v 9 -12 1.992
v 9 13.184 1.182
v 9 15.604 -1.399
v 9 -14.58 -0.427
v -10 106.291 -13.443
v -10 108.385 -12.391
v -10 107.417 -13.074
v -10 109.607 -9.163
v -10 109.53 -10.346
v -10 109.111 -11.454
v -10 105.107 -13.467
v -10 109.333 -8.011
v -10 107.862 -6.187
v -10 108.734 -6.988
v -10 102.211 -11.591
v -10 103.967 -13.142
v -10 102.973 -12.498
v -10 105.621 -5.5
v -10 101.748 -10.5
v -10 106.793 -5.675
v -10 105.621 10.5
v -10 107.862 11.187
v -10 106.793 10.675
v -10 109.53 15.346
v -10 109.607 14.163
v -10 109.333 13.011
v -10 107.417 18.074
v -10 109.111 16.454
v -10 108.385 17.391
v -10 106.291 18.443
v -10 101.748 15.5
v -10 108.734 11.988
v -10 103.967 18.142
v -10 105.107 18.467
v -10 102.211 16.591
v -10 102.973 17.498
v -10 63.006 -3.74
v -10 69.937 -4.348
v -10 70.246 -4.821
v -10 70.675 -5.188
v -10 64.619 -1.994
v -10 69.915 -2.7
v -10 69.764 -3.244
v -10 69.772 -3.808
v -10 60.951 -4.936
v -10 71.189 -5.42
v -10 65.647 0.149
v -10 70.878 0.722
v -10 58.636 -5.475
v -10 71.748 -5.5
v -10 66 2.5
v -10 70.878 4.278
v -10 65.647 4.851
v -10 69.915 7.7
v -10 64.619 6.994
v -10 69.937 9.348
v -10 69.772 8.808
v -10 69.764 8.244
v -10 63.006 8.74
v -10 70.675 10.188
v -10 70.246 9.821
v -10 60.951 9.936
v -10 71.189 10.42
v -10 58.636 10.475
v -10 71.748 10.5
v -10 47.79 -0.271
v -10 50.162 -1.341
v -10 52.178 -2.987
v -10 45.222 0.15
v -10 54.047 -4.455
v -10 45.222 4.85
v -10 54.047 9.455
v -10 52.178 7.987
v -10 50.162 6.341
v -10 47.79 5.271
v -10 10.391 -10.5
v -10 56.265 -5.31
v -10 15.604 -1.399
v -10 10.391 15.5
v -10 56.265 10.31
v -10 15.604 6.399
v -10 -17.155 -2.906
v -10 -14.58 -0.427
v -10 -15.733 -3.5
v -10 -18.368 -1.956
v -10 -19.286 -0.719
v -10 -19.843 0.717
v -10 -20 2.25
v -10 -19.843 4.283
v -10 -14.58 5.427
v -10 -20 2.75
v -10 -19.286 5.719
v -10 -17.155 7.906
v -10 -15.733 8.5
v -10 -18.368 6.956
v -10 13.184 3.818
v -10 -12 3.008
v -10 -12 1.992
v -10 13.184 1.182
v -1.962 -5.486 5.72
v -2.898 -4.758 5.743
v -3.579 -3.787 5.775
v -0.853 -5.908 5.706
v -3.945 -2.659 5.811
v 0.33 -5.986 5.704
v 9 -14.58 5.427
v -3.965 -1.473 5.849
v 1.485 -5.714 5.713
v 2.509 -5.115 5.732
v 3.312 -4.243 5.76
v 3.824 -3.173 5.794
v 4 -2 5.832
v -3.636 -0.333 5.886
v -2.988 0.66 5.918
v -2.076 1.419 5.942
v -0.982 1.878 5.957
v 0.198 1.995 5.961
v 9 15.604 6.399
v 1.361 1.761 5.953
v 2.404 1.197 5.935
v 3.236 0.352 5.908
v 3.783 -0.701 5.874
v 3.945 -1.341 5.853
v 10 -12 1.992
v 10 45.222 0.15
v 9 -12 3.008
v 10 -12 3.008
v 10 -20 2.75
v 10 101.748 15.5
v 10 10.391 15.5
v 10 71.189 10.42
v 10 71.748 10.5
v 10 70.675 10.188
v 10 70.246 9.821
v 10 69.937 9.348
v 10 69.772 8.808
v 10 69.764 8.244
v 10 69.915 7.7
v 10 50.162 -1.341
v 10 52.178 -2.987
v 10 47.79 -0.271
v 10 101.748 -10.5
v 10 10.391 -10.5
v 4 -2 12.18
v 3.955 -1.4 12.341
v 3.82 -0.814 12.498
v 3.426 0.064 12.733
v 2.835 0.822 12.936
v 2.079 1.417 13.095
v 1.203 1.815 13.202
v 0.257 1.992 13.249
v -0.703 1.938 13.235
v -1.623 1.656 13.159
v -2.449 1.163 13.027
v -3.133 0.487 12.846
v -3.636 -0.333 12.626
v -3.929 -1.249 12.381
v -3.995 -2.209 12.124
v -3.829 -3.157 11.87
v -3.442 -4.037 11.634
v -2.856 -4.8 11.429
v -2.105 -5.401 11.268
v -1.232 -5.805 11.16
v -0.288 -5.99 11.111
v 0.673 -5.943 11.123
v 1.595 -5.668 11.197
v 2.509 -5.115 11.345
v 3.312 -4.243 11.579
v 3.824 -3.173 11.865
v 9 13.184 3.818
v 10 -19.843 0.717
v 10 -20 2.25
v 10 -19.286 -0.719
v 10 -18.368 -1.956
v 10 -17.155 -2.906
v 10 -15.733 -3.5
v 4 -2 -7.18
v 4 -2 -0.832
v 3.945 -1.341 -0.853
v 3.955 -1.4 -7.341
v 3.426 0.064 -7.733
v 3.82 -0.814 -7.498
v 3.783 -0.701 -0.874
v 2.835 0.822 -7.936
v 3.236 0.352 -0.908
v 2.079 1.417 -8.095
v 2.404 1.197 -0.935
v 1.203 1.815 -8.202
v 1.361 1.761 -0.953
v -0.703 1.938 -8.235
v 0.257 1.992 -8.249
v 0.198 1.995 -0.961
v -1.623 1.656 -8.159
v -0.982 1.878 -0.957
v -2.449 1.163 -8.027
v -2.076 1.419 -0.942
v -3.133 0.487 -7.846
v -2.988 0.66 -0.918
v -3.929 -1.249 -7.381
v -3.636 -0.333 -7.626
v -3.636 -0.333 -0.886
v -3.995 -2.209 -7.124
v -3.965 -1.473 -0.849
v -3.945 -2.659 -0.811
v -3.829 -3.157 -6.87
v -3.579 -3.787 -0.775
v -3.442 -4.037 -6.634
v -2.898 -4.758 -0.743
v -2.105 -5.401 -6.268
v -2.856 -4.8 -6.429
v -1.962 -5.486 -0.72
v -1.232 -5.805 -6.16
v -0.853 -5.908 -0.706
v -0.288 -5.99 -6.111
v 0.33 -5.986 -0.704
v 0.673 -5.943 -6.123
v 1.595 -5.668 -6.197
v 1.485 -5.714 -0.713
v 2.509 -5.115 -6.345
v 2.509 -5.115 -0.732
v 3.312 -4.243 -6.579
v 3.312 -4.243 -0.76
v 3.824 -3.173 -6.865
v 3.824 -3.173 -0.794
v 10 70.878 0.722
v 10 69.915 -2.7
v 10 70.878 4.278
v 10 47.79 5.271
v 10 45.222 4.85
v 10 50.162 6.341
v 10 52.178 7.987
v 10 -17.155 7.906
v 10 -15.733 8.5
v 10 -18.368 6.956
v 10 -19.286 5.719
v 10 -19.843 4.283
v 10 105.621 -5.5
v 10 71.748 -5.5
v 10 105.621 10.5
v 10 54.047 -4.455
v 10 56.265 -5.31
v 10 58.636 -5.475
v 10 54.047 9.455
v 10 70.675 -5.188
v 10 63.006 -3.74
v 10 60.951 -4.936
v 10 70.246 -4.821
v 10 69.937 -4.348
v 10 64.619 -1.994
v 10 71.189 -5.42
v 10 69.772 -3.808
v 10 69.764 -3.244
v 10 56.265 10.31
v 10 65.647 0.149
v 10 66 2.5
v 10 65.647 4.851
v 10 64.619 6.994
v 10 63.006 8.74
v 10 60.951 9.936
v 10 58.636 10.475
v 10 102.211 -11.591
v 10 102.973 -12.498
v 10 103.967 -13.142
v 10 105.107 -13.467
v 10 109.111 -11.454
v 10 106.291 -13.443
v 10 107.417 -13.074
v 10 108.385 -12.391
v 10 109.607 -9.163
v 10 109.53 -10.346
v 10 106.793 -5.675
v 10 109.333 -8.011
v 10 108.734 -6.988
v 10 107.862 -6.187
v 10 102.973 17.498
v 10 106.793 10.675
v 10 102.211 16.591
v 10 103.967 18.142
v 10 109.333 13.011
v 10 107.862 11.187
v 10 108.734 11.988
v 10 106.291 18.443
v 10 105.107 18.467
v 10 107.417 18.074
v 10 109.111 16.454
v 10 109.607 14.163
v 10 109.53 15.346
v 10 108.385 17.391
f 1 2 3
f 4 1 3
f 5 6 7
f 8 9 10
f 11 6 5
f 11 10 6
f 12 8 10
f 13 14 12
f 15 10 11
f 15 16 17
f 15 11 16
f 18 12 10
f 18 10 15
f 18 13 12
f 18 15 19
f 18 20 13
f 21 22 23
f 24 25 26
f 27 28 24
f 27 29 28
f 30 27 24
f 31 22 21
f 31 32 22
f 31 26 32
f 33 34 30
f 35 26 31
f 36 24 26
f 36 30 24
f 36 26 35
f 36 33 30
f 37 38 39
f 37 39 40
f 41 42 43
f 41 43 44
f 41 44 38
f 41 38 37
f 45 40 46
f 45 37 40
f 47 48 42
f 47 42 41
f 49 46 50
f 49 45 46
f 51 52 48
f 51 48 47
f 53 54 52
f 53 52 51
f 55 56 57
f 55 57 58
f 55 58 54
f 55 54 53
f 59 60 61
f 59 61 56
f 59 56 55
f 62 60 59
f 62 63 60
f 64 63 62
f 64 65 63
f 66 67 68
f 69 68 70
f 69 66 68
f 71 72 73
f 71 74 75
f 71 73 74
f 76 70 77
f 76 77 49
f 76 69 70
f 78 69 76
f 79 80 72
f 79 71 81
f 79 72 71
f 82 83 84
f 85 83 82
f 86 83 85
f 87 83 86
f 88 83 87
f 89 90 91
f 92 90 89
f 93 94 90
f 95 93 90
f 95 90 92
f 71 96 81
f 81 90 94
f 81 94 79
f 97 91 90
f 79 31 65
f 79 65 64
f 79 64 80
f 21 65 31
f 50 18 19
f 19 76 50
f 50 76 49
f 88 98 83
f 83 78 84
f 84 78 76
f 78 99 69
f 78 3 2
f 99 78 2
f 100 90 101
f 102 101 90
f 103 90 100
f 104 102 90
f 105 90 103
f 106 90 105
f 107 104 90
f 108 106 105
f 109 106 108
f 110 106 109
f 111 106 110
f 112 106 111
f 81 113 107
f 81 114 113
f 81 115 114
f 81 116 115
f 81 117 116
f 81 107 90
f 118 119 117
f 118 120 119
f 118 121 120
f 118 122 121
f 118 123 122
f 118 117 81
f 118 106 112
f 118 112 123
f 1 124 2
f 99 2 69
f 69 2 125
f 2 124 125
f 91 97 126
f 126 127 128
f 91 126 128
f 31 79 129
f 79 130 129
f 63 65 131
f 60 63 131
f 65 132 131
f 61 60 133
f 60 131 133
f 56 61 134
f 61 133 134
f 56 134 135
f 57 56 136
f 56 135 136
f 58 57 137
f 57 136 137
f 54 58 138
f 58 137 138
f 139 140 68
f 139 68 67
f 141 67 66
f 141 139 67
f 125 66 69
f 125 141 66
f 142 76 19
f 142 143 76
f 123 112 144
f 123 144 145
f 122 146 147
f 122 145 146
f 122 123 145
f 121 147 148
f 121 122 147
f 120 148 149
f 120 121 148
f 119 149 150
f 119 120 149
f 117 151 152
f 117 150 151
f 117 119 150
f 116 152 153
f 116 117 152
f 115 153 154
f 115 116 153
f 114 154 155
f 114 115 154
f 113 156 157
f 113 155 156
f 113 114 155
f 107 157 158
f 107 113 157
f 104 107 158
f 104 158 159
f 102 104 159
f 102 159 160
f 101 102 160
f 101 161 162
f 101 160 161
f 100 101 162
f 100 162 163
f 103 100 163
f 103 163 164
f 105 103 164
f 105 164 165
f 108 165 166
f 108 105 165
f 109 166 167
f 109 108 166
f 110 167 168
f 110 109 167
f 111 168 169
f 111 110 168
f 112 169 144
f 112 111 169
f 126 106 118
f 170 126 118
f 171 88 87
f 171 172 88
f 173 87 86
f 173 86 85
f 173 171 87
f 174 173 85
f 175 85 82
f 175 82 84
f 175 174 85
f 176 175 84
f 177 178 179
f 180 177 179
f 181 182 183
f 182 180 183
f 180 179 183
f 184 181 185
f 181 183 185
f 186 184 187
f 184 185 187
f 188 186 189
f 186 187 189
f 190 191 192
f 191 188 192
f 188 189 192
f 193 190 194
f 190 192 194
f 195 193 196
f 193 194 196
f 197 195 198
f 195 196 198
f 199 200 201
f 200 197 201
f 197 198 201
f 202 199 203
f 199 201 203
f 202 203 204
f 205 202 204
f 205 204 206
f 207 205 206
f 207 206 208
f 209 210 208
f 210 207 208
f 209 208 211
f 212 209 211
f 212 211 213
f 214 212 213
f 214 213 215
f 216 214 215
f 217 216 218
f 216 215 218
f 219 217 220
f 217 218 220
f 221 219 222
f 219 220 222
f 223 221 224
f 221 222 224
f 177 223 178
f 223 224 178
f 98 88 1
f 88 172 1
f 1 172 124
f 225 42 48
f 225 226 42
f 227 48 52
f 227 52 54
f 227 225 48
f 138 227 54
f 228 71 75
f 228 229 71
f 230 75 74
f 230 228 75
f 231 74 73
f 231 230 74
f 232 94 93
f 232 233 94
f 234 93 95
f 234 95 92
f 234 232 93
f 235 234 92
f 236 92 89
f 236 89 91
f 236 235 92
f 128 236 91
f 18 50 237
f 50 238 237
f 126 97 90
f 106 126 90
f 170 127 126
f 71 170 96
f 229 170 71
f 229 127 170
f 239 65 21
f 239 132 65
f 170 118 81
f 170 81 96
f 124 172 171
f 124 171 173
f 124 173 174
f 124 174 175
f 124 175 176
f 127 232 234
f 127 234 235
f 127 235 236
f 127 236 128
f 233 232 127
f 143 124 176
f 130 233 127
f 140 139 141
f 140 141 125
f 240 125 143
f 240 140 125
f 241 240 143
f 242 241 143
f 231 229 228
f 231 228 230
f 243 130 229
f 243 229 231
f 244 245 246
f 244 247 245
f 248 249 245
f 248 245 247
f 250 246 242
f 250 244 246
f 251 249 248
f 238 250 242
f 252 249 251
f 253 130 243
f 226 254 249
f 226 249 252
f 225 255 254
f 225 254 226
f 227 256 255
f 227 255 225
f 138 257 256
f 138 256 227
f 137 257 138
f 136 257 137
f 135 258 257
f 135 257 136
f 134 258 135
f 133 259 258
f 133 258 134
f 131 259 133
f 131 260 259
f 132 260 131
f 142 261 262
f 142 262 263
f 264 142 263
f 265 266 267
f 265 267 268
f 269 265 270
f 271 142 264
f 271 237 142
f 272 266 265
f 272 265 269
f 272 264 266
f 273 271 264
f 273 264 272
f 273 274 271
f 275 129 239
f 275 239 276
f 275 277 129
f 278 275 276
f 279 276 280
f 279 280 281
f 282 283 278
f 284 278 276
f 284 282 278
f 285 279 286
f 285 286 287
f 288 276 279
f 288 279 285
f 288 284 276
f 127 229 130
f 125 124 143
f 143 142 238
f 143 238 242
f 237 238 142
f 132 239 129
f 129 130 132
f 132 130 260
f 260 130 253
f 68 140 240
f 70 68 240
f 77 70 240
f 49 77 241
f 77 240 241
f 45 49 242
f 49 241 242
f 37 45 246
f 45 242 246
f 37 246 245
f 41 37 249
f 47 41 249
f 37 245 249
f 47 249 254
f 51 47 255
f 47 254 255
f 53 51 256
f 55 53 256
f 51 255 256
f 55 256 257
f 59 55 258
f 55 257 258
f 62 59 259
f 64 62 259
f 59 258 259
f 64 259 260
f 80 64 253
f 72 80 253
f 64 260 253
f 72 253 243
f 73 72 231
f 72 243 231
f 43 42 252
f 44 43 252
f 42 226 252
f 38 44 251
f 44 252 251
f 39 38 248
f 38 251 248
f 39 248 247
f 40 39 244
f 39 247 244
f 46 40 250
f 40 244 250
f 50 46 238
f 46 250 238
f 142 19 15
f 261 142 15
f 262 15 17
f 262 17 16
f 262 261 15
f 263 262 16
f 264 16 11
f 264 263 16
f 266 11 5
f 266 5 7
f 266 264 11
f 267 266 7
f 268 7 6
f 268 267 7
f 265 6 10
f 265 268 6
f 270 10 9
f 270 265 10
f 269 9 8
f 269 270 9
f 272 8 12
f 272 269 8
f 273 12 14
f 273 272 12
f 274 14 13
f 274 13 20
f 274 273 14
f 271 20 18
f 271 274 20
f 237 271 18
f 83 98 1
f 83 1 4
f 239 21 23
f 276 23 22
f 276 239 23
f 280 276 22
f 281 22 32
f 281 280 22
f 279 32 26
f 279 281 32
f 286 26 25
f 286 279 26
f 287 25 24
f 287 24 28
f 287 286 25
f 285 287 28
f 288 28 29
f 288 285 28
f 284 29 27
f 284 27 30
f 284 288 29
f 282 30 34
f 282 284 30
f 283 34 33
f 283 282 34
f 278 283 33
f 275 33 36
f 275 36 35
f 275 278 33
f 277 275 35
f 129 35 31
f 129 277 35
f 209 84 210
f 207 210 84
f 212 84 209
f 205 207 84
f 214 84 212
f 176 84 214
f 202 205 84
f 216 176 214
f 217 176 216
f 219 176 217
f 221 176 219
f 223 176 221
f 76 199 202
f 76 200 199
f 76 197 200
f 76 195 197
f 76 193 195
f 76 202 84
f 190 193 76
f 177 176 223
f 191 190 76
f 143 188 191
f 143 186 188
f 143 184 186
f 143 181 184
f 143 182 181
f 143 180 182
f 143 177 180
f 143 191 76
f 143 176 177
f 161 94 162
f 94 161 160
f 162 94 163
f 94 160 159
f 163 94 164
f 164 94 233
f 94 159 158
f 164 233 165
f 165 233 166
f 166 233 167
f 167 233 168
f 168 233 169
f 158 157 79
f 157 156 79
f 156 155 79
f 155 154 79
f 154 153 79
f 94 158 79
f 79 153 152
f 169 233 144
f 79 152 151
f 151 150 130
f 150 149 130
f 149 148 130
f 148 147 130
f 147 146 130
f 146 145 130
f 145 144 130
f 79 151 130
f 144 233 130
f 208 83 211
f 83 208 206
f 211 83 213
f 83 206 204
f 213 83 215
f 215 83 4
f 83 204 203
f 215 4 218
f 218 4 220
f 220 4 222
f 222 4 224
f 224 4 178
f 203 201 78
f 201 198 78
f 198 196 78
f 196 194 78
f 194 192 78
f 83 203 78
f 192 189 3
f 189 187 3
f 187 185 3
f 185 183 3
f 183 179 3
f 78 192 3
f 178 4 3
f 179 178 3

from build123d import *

# Parameters (mm, degrees)
PAD030_DEPTH         = 10
PAD041_DEPTH         = 1
SKETCH081_R          = 4
POCKET023_DEPTH      = 16.001
POCKET023_DEPTH_BACK = 16.001


with BuildPart() as part:
    # Sketch066 → Pad030 (new body, symmetric)
    with BuildSketch(Plane.YZ):
        with BuildLine():
            ThreePointArc((54.1777871717, -5.4865141741), (68, 0), (54.1777871717, 5.4865141741))
            ThreePointArc((47.2218073921, 2.3498355523), (51.010737248, 3.2286263383), (54.1777871717, 5.4865141741))
            Line((47.2218073921, 2.3498355523), (15.1843604449, 1.3183803873))
            Line((17.6038721988, 3.8988686334), (15.1843604449, 1.3183803873))
            Line((-12.580488246, 2.9270741413), (17.6038721988, 3.8988686334))
            Line((-10, 0.5075623873), (-12.580488246, 2.9270741413))
            Line((-10, 0.5075623873), (-18, 0.25))
            ThreePointArc((-13.7330991232, 6), (-16.8683496754, 3.8684055277), (-18, 0.25))
            Line((-13.7330991232, 6), (12.3912565298, 13))
            Line((12.3912565298, 13), (103.7477270849, 13))
            ThreePointArc((107.6207104311, 8), (110.7829880912, 14.4494897428), (103.7477270849, 13))
            Line((73.7477270849, 8), (107.6207104311, 8))
            ThreePointArc((73.7477270849, 8), (72.0744070318, 7.095445115), (71.9146968069, 5.2))
            ThreePointArc((71.9146968069, -5.2), (73, 0), (71.9146968069, 5.2))
            ThreePointArc((71.9146968069, -5.2), (72.0744070318, -7.095445115), (73.7477270849, -8))
            Line((73.7477270849, -8), (107.6207104311, -8))
            ThreePointArc((103.7477270849, -13), (110.7829880912, -14.4494897428), (107.6207104311, -8))
            Line((12.3912565298, -13), (103.7477270849, -13))
            Line((-13.7330991232, -6), (12.3912565298, -13))
            ThreePointArc((-18, -0.25), (-16.8683496754, -3.8684055277), (-13.7330991232, -6))
            Line((-18, -0.25), (-10, -0.5075623873))
            Line((-10, -0.5075623873), (-12.580488246, -2.9270741413))
            Line((-12.580488246, -2.9270741413), (17.6038721988, -3.8988686334))
            Line((17.6038721988, -3.8988686334), (15.1843604449, -1.3183803873))
            Line((15.1843604449, -1.3183803873), (47.2218073921, -2.3498355523))
            ThreePointArc((54.1777871717, -5.4865141741), (51.010737248, -3.2286263383), (47.2218073921, -2.3498355523))
        make_face()
    extrude(amount=PAD030_DEPTH, both=True)

    # Sketch082 (on Face28 of Pad030) → Pad041 (join)
    with BuildSketch(Plane.YZ.offset(10)):
        Polygon((-12.580488246, 2.9270741413), (-10, 0.5075623873), (15.1843604449, 1.3183803873), (17.6038721988, 3.8988686334), align=None)
        Polygon((-10, -0.5075623873), (15.1843604449, -1.3183803873), (17.6038721988, -3.8988686334), (-12.580488246, -2.9270741413), align=None)
    extrude(amount=-PAD041_DEPTH)

    # Sketch081 → Pocket023 (cut, two sides)
    with BuildSketch(Plane.XY) as pocket023_sk:
        Circle(SKETCH081_R)
    extrude(amount=-POCKET023_DEPTH, mode=Mode.SUBTRACT)
    extrude(pocket023_sk.sketch, amount=POCKET023_DEPTH_BACK, mode=Mode.SUBTRACT)


with BuildPart() as part_1:
    # Body021 placement: moved
    add(part.part.moved(Location((0, -2, 2.5))))


solid = part_1.part
